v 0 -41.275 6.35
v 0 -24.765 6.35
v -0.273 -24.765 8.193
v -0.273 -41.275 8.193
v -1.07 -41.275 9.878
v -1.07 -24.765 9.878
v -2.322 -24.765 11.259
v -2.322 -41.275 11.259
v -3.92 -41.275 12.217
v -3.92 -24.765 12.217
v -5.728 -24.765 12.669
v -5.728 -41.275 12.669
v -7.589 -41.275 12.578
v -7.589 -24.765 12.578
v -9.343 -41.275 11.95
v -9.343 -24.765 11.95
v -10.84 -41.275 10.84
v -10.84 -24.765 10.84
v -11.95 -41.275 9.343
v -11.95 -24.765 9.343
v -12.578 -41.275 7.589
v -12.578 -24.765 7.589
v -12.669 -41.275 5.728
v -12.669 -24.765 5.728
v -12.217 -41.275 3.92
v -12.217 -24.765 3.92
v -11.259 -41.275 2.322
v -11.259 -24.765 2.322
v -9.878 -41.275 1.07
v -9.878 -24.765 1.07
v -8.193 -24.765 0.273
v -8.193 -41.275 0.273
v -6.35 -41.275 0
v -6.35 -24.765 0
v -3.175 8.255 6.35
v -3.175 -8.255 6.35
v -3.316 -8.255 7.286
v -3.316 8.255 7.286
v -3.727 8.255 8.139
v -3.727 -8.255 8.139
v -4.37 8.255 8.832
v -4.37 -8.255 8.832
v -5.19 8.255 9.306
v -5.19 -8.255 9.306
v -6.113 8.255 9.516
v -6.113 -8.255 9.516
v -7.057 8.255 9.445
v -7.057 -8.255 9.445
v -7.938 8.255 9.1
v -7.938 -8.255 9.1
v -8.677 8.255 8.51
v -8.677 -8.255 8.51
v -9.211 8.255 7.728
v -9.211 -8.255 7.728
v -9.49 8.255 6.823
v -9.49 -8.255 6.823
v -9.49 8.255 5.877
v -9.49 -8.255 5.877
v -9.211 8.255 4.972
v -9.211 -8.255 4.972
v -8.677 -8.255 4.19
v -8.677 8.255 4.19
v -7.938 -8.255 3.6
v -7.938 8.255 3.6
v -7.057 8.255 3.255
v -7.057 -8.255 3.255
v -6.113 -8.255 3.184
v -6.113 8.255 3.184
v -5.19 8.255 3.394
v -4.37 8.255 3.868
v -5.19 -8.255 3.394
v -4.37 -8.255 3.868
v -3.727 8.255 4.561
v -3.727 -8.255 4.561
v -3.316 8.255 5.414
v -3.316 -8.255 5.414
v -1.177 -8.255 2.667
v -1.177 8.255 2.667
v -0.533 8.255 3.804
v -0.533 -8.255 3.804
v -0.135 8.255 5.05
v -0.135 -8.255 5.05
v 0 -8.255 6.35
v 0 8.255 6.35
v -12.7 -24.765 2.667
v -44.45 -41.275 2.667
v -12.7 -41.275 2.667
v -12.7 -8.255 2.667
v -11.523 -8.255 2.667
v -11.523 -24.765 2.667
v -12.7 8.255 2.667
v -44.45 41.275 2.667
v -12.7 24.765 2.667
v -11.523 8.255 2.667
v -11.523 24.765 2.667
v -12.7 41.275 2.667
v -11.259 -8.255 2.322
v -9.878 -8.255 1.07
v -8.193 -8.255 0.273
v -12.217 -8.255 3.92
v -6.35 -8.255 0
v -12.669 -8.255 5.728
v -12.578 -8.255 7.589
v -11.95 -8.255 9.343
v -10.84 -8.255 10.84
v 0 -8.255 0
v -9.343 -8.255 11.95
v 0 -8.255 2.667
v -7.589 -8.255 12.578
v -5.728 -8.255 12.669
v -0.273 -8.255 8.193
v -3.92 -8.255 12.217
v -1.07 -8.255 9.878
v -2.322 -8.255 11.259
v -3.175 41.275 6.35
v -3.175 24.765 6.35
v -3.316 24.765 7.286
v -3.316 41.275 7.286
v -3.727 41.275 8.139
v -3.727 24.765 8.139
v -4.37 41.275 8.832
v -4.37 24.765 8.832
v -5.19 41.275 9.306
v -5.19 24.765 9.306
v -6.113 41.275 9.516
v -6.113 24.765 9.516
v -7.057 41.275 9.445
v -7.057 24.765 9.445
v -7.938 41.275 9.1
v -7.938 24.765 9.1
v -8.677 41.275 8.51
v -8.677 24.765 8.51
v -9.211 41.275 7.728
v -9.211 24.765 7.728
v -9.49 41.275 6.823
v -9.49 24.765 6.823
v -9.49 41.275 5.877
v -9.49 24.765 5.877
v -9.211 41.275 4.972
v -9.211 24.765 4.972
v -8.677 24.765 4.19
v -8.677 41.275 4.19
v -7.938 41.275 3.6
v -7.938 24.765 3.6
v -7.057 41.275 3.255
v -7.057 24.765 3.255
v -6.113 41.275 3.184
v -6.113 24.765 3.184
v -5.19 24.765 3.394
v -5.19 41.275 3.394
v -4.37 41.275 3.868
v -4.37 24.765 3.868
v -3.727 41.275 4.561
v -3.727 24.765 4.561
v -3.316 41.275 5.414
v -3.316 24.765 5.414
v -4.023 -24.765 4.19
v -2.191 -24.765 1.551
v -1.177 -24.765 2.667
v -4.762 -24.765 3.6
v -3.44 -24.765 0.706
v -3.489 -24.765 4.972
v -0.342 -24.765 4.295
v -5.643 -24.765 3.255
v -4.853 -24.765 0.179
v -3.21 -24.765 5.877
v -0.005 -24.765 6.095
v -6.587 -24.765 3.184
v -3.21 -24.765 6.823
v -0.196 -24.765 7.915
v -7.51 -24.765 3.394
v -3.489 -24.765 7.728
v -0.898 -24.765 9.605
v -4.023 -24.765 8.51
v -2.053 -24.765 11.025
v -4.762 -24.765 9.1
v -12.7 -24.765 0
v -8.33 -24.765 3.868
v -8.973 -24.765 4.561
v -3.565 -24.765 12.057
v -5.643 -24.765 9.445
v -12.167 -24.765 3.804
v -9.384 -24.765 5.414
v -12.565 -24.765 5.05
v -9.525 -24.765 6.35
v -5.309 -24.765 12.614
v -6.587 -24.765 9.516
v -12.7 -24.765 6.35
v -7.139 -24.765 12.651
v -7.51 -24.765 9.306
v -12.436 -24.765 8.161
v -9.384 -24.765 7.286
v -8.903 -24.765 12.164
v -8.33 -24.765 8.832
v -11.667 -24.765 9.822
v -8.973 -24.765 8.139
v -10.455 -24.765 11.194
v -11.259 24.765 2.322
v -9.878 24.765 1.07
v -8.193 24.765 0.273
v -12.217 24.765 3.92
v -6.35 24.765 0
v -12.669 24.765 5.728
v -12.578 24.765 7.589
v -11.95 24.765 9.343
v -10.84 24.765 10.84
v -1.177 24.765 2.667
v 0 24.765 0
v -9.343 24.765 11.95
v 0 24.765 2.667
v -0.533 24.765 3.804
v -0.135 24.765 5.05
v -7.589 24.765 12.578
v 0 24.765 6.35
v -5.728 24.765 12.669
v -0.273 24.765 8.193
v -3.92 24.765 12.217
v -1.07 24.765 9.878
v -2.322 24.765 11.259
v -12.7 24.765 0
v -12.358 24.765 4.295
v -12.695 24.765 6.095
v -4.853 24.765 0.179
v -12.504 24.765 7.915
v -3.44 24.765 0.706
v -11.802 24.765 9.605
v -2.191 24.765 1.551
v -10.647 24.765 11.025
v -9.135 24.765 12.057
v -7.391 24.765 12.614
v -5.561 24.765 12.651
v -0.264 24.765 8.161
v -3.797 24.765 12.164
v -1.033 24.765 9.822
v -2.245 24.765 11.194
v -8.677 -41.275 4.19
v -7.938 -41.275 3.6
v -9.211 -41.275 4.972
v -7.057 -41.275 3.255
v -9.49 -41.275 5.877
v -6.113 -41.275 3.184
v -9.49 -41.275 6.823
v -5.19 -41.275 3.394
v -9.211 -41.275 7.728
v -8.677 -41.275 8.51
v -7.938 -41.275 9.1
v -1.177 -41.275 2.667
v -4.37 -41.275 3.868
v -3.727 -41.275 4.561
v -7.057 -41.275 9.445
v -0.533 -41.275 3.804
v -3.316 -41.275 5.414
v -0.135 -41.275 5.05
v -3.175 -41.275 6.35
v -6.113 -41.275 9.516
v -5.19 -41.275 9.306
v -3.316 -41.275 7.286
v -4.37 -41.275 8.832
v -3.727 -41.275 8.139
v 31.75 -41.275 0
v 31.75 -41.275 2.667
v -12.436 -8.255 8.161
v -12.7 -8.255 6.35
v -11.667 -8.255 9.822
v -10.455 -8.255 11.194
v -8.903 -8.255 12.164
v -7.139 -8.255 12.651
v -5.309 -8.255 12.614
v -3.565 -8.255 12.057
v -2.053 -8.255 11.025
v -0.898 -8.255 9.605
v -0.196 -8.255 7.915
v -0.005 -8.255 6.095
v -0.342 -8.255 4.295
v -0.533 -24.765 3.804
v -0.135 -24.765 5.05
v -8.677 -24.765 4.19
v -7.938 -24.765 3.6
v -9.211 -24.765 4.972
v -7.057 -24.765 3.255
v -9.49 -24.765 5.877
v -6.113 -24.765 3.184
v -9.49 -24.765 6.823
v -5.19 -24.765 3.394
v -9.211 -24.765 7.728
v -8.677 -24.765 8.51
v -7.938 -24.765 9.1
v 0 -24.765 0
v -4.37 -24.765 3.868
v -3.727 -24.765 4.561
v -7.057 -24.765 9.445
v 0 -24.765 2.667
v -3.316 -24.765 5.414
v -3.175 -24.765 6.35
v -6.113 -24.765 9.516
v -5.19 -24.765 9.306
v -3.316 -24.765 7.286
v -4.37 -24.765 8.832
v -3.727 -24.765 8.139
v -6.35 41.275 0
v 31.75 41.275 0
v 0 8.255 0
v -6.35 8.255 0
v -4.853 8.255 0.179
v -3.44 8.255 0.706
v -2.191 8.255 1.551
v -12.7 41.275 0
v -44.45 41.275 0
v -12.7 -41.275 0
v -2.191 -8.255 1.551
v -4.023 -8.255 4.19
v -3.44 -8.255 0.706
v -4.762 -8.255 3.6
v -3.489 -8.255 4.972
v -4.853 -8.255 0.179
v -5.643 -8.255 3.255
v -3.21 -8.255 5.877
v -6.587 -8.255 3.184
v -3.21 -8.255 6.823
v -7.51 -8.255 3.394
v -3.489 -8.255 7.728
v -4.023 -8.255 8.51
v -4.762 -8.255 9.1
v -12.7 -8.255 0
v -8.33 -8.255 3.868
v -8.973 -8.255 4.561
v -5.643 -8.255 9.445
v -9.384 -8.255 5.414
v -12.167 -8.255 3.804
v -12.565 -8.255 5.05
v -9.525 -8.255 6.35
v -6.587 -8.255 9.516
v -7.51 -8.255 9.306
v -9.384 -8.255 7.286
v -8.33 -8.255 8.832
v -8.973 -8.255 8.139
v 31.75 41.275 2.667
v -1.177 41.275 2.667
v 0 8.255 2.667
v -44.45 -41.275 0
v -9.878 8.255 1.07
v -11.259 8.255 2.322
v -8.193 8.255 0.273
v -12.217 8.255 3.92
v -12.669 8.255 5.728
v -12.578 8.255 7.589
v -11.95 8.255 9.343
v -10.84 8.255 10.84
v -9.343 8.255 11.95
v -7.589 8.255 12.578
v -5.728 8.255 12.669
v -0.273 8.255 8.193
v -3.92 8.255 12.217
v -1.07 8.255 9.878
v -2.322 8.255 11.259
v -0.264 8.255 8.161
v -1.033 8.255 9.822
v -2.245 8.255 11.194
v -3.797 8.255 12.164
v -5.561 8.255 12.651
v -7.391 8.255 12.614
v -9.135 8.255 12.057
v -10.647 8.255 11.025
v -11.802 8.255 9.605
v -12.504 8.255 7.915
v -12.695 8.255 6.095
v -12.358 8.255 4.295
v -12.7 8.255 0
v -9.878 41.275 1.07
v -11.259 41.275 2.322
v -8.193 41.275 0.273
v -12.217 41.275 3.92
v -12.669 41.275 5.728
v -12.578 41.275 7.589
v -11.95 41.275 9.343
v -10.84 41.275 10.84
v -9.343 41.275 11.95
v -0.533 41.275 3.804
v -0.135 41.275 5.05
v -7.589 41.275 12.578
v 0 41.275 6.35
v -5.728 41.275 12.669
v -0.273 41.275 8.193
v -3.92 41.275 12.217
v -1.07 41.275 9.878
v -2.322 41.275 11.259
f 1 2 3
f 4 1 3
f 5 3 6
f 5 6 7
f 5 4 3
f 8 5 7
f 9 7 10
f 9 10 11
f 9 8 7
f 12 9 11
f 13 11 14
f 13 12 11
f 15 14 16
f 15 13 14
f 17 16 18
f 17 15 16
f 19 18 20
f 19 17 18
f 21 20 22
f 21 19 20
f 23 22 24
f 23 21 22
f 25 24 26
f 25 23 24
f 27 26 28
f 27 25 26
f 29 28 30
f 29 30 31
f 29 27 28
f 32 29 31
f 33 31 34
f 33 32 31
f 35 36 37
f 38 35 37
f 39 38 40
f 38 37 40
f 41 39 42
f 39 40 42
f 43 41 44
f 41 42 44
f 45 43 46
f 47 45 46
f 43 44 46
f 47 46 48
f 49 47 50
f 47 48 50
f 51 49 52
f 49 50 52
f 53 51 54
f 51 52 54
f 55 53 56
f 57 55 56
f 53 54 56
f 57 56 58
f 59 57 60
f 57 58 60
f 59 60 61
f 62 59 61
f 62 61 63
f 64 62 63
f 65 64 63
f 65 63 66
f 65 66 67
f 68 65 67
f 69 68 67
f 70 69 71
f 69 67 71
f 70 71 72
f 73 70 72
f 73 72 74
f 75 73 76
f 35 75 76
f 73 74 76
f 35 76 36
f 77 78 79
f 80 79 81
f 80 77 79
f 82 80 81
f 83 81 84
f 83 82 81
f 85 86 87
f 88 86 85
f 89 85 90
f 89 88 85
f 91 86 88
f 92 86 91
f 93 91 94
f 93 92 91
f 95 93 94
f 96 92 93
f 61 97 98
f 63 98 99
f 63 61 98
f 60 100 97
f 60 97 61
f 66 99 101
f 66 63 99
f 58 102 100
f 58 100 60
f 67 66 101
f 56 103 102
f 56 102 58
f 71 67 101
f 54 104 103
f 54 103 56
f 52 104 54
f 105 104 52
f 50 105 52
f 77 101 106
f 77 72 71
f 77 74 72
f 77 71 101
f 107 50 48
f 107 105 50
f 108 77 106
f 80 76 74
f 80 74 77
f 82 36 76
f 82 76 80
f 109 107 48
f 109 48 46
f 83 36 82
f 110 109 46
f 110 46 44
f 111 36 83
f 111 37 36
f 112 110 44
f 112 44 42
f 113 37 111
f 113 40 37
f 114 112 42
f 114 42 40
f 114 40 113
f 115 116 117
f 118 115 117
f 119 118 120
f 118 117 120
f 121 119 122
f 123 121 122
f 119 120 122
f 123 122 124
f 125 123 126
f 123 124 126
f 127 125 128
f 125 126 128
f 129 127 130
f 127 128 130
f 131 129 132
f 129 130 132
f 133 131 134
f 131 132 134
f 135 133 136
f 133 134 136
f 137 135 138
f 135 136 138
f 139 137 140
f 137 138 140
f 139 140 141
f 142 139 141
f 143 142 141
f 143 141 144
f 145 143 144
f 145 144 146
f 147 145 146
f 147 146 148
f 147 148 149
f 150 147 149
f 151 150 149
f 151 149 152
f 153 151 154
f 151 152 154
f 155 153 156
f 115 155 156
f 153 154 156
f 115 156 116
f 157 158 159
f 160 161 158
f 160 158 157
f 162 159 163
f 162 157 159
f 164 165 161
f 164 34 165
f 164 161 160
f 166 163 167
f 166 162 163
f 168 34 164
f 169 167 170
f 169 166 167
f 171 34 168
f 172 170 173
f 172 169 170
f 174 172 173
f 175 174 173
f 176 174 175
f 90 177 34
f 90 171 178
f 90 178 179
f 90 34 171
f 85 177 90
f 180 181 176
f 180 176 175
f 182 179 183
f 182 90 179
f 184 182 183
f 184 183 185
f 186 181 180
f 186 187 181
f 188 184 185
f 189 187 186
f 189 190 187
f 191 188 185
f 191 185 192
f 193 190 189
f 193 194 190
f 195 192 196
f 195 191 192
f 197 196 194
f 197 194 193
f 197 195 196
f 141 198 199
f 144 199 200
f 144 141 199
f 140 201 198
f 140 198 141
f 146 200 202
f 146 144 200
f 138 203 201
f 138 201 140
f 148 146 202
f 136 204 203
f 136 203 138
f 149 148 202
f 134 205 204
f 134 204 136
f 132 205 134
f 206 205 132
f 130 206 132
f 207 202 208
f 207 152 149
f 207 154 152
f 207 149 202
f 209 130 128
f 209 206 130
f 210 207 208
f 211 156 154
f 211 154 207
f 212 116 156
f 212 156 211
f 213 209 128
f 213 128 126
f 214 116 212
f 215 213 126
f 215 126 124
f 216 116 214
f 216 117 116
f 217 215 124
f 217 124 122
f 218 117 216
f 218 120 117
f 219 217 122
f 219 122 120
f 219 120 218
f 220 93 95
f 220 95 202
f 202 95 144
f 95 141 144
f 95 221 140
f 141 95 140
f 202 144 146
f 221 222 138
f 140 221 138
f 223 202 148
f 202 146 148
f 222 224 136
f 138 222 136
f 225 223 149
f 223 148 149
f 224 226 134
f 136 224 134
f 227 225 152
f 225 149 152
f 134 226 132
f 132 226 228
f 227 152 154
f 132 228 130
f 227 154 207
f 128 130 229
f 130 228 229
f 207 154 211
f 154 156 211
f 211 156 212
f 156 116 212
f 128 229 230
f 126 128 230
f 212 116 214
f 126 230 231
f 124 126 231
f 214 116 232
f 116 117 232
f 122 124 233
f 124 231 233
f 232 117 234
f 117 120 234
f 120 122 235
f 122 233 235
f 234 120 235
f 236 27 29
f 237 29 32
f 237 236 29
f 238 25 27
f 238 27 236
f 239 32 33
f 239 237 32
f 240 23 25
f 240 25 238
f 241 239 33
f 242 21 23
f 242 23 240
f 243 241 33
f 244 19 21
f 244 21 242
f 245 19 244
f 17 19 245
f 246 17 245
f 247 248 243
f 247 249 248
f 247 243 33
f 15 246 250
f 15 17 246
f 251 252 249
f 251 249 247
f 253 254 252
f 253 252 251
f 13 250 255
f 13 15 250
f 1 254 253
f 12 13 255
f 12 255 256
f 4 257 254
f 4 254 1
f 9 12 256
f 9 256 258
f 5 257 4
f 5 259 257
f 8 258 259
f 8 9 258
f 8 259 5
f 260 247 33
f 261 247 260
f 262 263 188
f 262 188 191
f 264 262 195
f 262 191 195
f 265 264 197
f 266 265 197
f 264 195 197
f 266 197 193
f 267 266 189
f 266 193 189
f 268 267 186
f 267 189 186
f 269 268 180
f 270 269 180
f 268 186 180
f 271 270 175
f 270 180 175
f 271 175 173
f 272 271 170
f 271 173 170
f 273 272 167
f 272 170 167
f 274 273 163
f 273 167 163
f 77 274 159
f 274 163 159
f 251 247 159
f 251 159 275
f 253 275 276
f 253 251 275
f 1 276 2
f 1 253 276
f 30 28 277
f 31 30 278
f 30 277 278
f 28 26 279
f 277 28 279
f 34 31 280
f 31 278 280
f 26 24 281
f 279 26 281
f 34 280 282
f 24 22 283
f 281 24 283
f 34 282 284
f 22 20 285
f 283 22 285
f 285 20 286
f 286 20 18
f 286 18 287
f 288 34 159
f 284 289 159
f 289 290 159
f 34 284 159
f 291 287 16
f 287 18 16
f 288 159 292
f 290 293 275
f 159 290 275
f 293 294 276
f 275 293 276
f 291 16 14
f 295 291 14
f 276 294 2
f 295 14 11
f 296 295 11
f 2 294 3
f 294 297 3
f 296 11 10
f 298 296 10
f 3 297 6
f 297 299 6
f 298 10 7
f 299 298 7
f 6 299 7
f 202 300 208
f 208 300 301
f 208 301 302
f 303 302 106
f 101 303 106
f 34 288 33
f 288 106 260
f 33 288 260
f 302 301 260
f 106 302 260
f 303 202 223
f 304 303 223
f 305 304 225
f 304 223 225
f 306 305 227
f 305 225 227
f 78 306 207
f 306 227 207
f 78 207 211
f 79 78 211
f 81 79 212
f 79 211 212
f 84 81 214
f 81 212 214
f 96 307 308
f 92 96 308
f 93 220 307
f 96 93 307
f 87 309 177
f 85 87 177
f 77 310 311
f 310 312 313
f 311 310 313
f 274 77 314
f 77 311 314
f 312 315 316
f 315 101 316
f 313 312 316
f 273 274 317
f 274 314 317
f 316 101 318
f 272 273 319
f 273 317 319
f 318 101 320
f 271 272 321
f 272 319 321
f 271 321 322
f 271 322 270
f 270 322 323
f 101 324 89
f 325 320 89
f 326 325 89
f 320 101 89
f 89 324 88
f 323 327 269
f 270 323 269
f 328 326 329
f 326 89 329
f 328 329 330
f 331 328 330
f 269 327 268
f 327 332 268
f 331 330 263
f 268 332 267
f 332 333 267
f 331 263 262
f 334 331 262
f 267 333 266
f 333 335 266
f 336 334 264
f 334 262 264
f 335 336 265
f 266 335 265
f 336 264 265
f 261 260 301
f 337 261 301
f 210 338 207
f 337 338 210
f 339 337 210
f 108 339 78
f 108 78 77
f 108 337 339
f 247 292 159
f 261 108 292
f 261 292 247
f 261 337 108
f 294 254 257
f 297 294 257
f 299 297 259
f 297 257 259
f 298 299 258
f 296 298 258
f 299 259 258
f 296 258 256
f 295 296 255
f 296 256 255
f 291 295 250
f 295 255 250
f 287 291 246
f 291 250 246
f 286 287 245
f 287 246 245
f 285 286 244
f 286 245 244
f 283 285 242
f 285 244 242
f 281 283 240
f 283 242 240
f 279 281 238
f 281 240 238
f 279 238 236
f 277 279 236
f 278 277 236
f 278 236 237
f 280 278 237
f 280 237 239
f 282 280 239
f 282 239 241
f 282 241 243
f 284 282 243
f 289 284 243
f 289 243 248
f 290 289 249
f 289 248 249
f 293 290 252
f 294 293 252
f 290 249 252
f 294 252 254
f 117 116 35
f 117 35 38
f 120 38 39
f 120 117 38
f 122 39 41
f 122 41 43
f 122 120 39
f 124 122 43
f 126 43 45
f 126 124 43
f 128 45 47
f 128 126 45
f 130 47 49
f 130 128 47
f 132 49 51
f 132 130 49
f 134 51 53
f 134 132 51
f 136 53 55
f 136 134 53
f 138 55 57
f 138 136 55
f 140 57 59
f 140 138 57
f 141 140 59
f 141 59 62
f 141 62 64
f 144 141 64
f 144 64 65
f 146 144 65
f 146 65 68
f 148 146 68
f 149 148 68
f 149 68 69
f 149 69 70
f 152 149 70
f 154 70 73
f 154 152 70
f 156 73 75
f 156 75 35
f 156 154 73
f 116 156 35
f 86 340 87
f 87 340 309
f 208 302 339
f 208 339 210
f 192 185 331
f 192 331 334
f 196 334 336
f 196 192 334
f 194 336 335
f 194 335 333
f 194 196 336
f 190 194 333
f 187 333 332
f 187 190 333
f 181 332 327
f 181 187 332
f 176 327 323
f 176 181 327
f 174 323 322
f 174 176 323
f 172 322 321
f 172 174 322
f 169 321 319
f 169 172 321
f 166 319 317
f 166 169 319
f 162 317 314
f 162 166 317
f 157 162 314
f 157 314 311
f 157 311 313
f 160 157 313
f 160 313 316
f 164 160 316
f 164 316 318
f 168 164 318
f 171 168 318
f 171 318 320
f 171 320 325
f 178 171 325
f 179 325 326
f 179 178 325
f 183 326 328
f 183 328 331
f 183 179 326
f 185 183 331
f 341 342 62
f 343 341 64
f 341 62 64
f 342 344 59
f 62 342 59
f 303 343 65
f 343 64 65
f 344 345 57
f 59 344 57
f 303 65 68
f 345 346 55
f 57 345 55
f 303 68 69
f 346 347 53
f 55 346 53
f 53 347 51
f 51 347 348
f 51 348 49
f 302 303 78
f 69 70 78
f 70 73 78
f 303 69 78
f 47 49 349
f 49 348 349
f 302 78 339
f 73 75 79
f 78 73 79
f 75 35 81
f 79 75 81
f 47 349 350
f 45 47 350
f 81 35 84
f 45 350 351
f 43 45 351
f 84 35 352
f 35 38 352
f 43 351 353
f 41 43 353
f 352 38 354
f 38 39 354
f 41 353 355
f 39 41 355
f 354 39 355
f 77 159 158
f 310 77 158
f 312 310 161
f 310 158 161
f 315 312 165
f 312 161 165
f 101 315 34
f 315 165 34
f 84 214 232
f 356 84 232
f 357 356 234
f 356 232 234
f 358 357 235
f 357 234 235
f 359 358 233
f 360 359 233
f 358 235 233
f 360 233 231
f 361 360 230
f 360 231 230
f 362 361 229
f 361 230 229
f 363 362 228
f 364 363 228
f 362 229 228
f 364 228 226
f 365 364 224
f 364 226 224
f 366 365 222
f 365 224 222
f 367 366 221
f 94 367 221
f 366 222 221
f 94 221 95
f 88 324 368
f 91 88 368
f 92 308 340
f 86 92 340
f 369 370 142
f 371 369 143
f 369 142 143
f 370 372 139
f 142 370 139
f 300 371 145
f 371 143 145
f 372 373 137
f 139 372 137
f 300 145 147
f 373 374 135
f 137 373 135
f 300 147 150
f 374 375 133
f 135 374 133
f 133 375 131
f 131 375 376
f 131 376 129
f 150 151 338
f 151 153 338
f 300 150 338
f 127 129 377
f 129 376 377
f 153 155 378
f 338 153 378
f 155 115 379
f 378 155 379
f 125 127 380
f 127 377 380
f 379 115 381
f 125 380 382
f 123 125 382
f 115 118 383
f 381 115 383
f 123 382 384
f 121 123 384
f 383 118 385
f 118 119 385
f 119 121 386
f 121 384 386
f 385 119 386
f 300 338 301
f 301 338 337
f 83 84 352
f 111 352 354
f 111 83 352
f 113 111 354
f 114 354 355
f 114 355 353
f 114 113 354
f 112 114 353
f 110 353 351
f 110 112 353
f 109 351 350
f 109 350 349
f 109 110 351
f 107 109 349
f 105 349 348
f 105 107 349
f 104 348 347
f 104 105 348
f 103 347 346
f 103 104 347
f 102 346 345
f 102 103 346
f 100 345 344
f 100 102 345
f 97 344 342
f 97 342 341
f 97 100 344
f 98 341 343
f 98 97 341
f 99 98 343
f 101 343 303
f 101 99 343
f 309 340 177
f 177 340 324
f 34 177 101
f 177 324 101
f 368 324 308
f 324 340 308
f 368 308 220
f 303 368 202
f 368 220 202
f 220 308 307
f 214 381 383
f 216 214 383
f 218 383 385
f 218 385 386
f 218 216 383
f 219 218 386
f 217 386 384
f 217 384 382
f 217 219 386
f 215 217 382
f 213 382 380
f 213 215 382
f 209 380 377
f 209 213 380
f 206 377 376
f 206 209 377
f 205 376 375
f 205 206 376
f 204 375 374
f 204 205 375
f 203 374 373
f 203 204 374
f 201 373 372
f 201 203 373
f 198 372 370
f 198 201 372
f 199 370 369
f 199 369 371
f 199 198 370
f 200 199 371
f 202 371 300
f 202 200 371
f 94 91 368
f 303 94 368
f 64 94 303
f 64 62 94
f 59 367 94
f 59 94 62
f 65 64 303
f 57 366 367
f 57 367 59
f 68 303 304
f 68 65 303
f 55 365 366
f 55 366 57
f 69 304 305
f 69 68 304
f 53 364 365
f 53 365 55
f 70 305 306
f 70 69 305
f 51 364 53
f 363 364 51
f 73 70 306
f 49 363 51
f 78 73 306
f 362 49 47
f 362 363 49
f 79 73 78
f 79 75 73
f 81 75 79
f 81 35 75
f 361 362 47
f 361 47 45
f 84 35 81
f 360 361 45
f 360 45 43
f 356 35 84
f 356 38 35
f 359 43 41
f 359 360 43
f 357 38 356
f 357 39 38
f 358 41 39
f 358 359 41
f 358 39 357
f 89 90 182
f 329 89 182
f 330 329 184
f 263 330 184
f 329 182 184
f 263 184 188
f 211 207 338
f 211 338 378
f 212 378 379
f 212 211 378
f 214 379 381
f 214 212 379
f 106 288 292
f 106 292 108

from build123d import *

# Parameters (mm, degrees)
F0_W      = 31.75
F0_H      = 82.55
F1_DEPTH  = 2.667
F2_W      = 16.51
F2_H      = 2.667
F3_DEPTH  = 6.35
F4_R      = 3.175
F5_DEPTH  = 16.51
F6_R      = 3.175
F7_DEPTH  = 16.51
F8_R      = 3.175
F9_DEPTH  = 16.51
F11_DEPTH = 2.667
F12_W     = 16.51
F12_H     = 2.667
F13_DEPTH = 6.35
F14_R     = 3.175
F15_DEPTH = 16.51
F16_R     = 3.175
F17_DEPTH = 16.51


with BuildPart() as f1:
    # F0 (on Top) → F1 (new body)
    with BuildSketch(Plane.XY):
        with Locations((15.875, 0)):
            Rectangle(F0_W, F0_H)
    extrude(amount=F1_DEPTH)

    # F2 (on face) → F3 (join)
    with BuildSketch(Plane(origin=(0, 0, 0), x_dir=(0, -1, 0), z_dir=(-1, 0, 0))):
        with Locations((-33.02, 1.3335)):
            Rectangle(F2_W, F2_H)
        with Locations((0, 1.3335)):
            Rectangle(F2_W, F2_H)
        with Locations((33.02, 1.3335)):
            Rectangle(F2_W, F2_H)
    extrude(amount=F3_DEPTH)

    # F4 (on face) → F5 (join, through all)
    with BuildSketch(Plane.XZ.offset(41.275)):
        with BuildLine():
            ThreePointArc((-1.177185389, 2.667), (-0.3014517122, 4.4167220557), (0, 6.35))
            ThreePointArc((0, 6.35), (-10.8401280605, 10.8401280605), (-6.35, 0))
            Line((-6.35, 0), (-6.35, 2.667))
            Line((-6.35, 2.667), (-1.177185389, 2.667))
        make_face()
        with Locations((-6.35, 6.35)):
            Circle(F4_R, mode=Mode.SUBTRACT)
    extrude(amount=-F5_DEPTH)

    # F6 (on face) → F7 (join, through all)
    with BuildSketch(Plane.XZ.offset(8.255)):
        with BuildLine():
            ThreePointArc((-1.177185389, 2.667), (-0.3014517122, 4.4167220557), (0, 6.35))
            ThreePointArc((0, 6.35), (-10.8401280605, 10.8401280605), (-6.35, 0))
            Line((-6.35, 0), (-6.35, 2.667))
            Line((-6.35, 2.667), (-1.177185389, 2.667))
        make_face()
        with Locations((-6.35, 6.35)):
            Circle(F6_R, mode=Mode.SUBTRACT)
    extrude(amount=-F7_DEPTH)

    # F8 (on face) → F9 (join, through all)
    with BuildSketch(Plane.XZ.offset(-24.765)):
        with BuildLine():
            ThreePointArc((-1.177185389, 2.667), (-0.3014517122, 4.4167220557), (0, 6.35))
            ThreePointArc((0, 6.35), (-10.8401280605, 10.8401280605), (-6.35, 0))
            Line((-6.35, 0), (-6.35, 2.667))
            Line((-6.35, 2.667), (-1.177185389, 2.667))
        make_face()
        with Locations((-6.35, 6.35)):
            Circle(F8_R, mode=Mode.SUBTRACT)
    extrude(amount=-F9_DEPTH)


with BuildPart() as f11:
    # F10 (on Top) → F11 (new body)
    with BuildSketch(Plane.XY):
        Polygon((-12.7, -40.005), (-12.7, 40.005), (-12.7, 41.275), (-44.45, 41.275), (-44.45, -41.275), (-12.7, -41.275), align=None)
    extrude(amount=F11_DEPTH)

    # F12 (on face) → F13 (join)
    with BuildSketch(Plane.YZ.offset(-12.7)):
        with Locations((-16.51, 1.3335)):
            Rectangle(F12_W, F12_H)
        with Locations((16.51, 1.3335)):
            Rectangle(F12_W, F12_H)
    extrude(amount=F13_DEPTH)

    # F14 (on face) → F15 (join, through all)
    with BuildSketch(Plane.XZ.offset(-24.765)):
        with BuildLine():
            ThreePointArc((-1.177185389, 2.667), (-0.3014517122, 4.4167220557), (0, 6.35))
            ThreePointArc((0, 6.35), (-10.8401280605, 10.8401280605), (-6.35, 0))
            ThreePointArc((-6.35, 0), (-3.4400644337, 0.705996545), (-1.177185389, 2.667))
        make_face()
        with Locations((-6.35, 6.35)):
            Circle(F14_R, mode=Mode.SUBTRACT)
    extrude(amount=F15_DEPTH)

    # F16 (on face) → F17 (join, through all)
    with BuildSketch(Plane(origin=(0, -24.765, 0), x_dir=(-1, 0, 0), z_dir=(0, 1, 0))):
        with BuildLine():
            ThreePointArc((6.35, 0), (10.8401280605, 1.8598719395), (12.7, 6.35))
            ThreePointArc((12.7, 6.35), (4.4167220557, 12.3985482878), (1.177185389, 2.667))
            ThreePointArc((1.177185389, 2.667), (3.4400644337, 0.705996545), (6.35, 0))
        make_face()
        with Locations((6.35, 6.35)):
            Circle(F16_R, mode=Mode.SUBTRACT)
    extrude(amount=F17_DEPTH)


solid = Compound([f1.part, f11.part])
